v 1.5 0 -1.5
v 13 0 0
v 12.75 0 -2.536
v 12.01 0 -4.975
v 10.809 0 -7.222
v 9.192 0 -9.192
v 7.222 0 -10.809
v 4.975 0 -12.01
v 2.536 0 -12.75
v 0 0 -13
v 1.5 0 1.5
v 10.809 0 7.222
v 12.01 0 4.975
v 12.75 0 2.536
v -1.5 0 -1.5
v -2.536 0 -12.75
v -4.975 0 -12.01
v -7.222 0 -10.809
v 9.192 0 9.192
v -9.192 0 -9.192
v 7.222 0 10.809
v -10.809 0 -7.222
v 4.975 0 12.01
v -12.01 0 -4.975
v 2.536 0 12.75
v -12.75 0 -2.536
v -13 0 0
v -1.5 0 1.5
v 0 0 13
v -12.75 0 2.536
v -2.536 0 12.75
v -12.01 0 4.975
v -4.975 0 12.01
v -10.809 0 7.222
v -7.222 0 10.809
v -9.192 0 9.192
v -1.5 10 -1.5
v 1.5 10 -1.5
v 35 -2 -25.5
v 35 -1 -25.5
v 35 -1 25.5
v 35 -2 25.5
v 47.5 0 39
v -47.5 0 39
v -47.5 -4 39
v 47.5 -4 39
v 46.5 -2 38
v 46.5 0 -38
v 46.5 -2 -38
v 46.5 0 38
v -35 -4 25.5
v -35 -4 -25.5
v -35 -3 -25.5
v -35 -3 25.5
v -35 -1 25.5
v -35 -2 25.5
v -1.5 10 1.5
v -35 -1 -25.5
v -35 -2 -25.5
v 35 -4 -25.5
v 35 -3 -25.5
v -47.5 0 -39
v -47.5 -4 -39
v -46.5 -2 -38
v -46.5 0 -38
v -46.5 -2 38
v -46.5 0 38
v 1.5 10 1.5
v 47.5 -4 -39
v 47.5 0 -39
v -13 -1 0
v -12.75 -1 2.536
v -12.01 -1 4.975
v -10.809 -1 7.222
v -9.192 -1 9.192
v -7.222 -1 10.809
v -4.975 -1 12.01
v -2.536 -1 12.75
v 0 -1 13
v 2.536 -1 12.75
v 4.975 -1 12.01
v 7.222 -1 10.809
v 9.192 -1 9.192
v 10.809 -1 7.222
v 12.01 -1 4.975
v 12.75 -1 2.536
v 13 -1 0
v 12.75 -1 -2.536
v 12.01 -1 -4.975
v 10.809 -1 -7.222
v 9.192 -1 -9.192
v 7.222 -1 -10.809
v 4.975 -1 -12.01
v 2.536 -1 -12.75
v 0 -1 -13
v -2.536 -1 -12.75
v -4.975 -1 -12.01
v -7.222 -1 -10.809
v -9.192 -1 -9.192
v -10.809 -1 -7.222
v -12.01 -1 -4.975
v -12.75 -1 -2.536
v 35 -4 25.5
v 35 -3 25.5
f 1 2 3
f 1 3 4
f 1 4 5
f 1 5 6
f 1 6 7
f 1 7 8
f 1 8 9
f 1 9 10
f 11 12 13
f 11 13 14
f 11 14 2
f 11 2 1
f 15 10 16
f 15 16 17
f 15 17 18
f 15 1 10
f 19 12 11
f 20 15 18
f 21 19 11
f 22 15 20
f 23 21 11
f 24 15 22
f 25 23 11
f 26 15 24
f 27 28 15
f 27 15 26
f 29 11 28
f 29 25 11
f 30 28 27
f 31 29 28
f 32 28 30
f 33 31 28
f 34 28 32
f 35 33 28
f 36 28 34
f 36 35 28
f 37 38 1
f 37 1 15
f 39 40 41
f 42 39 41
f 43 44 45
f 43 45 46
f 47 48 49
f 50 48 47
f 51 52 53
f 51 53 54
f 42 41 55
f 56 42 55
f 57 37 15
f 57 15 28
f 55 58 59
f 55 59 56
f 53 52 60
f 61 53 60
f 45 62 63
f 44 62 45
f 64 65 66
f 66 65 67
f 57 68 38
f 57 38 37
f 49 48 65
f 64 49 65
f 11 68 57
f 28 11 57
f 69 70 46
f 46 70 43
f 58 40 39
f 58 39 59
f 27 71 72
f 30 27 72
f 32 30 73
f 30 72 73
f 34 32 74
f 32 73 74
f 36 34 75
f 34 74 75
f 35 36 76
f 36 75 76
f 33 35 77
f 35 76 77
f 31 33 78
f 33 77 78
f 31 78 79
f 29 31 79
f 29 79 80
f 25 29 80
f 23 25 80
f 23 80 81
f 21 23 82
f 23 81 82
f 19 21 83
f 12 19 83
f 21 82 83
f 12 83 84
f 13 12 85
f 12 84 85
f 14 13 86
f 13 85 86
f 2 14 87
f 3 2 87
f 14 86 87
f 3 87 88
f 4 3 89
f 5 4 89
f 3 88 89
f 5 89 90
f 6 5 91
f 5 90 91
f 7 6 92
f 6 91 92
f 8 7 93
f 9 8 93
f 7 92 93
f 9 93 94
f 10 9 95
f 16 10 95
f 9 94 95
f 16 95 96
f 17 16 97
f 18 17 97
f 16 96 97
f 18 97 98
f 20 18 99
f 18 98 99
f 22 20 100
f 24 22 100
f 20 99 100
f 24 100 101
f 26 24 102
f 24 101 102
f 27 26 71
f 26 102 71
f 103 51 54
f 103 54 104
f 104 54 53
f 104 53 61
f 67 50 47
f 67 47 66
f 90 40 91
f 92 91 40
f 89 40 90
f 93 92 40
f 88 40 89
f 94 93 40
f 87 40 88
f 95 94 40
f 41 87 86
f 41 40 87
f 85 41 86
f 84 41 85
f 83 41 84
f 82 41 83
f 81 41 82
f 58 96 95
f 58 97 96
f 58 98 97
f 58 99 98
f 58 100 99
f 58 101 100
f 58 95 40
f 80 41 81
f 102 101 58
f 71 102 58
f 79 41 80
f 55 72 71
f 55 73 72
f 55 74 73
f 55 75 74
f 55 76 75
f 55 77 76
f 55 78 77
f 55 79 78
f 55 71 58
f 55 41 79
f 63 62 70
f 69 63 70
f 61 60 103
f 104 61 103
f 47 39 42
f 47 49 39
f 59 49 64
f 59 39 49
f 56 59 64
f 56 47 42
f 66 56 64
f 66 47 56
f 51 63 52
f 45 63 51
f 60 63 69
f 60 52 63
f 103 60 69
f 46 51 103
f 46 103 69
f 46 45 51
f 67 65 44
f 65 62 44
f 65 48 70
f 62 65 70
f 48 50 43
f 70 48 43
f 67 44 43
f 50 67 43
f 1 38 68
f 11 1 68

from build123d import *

# Parameters (mm, degrees)
F0_W      = 95
F0_H      = 78
F1_DEPTH  = 4
F2_W      = 70
F2_H      = 51
F3_DEPTH  = 1
F4_W      = 93
F4_H      = 76
F4_W_2    = 70
F4_H_2    = 51
F5_DEPTH  = 2
F6_W      = 70
F6_H      = 51
F7_DEPTH  = 1
F8_R      = 13
F9_DEPTH  = 1
F10_W     = 3
F10_H     = 3
F11_DEPTH = 10


with BuildPart() as f1:
    # F0 (on Front) → F1 (new body)
    with BuildSketch(Plane.XZ):
        Rectangle(F0_W, F0_H)
    extrude(amount=F1_DEPTH)

    # F2 (on face) → F3 (cut)
    with BuildSketch(Plane(origin=(0, 0, 0), x_dir=(-1, 0, 0), z_dir=(0, 1, 0))):
        Rectangle(F2_W, F2_H)
    extrude(amount=-F3_DEPTH, mode=Mode.SUBTRACT)

    # F4 (on face) → F5 (cut)
    with BuildSketch(Plane(origin=(0, 0, 0), x_dir=(-1, 0, 0), z_dir=(0, 1, 0))):
        Rectangle(F4_W, F4_H)
        Rectangle(F4_W_2, F4_H_2, mode=Mode.SUBTRACT)
    extrude(amount=-F5_DEPTH, mode=Mode.SUBTRACT)

    # F6 (on face) → F7 (cut)
    with BuildSketch(Plane.XZ.offset(4)):
        Rectangle(F6_W, F6_H)
    extrude(amount=-F7_DEPTH, mode=Mode.SUBTRACT)

    # F8 (on face) → F9 (join)
    with BuildSketch(Plane(origin=(0, -1, 0), x_dir=(-1, 0, 0), z_dir=(0, 1, 0))):
        Circle(F8_R)
    extrude(amount=F9_DEPTH)

    # F10 (on face) → F11 (join)
    with BuildSketch(Plane(origin=(0, 0, 0), x_dir=(-1, 0, 0), z_dir=(0, 1, 0))):
        Rectangle(F10_W, F10_H)
    extrude(amount=F11_DEPTH)


solid = f1.part
